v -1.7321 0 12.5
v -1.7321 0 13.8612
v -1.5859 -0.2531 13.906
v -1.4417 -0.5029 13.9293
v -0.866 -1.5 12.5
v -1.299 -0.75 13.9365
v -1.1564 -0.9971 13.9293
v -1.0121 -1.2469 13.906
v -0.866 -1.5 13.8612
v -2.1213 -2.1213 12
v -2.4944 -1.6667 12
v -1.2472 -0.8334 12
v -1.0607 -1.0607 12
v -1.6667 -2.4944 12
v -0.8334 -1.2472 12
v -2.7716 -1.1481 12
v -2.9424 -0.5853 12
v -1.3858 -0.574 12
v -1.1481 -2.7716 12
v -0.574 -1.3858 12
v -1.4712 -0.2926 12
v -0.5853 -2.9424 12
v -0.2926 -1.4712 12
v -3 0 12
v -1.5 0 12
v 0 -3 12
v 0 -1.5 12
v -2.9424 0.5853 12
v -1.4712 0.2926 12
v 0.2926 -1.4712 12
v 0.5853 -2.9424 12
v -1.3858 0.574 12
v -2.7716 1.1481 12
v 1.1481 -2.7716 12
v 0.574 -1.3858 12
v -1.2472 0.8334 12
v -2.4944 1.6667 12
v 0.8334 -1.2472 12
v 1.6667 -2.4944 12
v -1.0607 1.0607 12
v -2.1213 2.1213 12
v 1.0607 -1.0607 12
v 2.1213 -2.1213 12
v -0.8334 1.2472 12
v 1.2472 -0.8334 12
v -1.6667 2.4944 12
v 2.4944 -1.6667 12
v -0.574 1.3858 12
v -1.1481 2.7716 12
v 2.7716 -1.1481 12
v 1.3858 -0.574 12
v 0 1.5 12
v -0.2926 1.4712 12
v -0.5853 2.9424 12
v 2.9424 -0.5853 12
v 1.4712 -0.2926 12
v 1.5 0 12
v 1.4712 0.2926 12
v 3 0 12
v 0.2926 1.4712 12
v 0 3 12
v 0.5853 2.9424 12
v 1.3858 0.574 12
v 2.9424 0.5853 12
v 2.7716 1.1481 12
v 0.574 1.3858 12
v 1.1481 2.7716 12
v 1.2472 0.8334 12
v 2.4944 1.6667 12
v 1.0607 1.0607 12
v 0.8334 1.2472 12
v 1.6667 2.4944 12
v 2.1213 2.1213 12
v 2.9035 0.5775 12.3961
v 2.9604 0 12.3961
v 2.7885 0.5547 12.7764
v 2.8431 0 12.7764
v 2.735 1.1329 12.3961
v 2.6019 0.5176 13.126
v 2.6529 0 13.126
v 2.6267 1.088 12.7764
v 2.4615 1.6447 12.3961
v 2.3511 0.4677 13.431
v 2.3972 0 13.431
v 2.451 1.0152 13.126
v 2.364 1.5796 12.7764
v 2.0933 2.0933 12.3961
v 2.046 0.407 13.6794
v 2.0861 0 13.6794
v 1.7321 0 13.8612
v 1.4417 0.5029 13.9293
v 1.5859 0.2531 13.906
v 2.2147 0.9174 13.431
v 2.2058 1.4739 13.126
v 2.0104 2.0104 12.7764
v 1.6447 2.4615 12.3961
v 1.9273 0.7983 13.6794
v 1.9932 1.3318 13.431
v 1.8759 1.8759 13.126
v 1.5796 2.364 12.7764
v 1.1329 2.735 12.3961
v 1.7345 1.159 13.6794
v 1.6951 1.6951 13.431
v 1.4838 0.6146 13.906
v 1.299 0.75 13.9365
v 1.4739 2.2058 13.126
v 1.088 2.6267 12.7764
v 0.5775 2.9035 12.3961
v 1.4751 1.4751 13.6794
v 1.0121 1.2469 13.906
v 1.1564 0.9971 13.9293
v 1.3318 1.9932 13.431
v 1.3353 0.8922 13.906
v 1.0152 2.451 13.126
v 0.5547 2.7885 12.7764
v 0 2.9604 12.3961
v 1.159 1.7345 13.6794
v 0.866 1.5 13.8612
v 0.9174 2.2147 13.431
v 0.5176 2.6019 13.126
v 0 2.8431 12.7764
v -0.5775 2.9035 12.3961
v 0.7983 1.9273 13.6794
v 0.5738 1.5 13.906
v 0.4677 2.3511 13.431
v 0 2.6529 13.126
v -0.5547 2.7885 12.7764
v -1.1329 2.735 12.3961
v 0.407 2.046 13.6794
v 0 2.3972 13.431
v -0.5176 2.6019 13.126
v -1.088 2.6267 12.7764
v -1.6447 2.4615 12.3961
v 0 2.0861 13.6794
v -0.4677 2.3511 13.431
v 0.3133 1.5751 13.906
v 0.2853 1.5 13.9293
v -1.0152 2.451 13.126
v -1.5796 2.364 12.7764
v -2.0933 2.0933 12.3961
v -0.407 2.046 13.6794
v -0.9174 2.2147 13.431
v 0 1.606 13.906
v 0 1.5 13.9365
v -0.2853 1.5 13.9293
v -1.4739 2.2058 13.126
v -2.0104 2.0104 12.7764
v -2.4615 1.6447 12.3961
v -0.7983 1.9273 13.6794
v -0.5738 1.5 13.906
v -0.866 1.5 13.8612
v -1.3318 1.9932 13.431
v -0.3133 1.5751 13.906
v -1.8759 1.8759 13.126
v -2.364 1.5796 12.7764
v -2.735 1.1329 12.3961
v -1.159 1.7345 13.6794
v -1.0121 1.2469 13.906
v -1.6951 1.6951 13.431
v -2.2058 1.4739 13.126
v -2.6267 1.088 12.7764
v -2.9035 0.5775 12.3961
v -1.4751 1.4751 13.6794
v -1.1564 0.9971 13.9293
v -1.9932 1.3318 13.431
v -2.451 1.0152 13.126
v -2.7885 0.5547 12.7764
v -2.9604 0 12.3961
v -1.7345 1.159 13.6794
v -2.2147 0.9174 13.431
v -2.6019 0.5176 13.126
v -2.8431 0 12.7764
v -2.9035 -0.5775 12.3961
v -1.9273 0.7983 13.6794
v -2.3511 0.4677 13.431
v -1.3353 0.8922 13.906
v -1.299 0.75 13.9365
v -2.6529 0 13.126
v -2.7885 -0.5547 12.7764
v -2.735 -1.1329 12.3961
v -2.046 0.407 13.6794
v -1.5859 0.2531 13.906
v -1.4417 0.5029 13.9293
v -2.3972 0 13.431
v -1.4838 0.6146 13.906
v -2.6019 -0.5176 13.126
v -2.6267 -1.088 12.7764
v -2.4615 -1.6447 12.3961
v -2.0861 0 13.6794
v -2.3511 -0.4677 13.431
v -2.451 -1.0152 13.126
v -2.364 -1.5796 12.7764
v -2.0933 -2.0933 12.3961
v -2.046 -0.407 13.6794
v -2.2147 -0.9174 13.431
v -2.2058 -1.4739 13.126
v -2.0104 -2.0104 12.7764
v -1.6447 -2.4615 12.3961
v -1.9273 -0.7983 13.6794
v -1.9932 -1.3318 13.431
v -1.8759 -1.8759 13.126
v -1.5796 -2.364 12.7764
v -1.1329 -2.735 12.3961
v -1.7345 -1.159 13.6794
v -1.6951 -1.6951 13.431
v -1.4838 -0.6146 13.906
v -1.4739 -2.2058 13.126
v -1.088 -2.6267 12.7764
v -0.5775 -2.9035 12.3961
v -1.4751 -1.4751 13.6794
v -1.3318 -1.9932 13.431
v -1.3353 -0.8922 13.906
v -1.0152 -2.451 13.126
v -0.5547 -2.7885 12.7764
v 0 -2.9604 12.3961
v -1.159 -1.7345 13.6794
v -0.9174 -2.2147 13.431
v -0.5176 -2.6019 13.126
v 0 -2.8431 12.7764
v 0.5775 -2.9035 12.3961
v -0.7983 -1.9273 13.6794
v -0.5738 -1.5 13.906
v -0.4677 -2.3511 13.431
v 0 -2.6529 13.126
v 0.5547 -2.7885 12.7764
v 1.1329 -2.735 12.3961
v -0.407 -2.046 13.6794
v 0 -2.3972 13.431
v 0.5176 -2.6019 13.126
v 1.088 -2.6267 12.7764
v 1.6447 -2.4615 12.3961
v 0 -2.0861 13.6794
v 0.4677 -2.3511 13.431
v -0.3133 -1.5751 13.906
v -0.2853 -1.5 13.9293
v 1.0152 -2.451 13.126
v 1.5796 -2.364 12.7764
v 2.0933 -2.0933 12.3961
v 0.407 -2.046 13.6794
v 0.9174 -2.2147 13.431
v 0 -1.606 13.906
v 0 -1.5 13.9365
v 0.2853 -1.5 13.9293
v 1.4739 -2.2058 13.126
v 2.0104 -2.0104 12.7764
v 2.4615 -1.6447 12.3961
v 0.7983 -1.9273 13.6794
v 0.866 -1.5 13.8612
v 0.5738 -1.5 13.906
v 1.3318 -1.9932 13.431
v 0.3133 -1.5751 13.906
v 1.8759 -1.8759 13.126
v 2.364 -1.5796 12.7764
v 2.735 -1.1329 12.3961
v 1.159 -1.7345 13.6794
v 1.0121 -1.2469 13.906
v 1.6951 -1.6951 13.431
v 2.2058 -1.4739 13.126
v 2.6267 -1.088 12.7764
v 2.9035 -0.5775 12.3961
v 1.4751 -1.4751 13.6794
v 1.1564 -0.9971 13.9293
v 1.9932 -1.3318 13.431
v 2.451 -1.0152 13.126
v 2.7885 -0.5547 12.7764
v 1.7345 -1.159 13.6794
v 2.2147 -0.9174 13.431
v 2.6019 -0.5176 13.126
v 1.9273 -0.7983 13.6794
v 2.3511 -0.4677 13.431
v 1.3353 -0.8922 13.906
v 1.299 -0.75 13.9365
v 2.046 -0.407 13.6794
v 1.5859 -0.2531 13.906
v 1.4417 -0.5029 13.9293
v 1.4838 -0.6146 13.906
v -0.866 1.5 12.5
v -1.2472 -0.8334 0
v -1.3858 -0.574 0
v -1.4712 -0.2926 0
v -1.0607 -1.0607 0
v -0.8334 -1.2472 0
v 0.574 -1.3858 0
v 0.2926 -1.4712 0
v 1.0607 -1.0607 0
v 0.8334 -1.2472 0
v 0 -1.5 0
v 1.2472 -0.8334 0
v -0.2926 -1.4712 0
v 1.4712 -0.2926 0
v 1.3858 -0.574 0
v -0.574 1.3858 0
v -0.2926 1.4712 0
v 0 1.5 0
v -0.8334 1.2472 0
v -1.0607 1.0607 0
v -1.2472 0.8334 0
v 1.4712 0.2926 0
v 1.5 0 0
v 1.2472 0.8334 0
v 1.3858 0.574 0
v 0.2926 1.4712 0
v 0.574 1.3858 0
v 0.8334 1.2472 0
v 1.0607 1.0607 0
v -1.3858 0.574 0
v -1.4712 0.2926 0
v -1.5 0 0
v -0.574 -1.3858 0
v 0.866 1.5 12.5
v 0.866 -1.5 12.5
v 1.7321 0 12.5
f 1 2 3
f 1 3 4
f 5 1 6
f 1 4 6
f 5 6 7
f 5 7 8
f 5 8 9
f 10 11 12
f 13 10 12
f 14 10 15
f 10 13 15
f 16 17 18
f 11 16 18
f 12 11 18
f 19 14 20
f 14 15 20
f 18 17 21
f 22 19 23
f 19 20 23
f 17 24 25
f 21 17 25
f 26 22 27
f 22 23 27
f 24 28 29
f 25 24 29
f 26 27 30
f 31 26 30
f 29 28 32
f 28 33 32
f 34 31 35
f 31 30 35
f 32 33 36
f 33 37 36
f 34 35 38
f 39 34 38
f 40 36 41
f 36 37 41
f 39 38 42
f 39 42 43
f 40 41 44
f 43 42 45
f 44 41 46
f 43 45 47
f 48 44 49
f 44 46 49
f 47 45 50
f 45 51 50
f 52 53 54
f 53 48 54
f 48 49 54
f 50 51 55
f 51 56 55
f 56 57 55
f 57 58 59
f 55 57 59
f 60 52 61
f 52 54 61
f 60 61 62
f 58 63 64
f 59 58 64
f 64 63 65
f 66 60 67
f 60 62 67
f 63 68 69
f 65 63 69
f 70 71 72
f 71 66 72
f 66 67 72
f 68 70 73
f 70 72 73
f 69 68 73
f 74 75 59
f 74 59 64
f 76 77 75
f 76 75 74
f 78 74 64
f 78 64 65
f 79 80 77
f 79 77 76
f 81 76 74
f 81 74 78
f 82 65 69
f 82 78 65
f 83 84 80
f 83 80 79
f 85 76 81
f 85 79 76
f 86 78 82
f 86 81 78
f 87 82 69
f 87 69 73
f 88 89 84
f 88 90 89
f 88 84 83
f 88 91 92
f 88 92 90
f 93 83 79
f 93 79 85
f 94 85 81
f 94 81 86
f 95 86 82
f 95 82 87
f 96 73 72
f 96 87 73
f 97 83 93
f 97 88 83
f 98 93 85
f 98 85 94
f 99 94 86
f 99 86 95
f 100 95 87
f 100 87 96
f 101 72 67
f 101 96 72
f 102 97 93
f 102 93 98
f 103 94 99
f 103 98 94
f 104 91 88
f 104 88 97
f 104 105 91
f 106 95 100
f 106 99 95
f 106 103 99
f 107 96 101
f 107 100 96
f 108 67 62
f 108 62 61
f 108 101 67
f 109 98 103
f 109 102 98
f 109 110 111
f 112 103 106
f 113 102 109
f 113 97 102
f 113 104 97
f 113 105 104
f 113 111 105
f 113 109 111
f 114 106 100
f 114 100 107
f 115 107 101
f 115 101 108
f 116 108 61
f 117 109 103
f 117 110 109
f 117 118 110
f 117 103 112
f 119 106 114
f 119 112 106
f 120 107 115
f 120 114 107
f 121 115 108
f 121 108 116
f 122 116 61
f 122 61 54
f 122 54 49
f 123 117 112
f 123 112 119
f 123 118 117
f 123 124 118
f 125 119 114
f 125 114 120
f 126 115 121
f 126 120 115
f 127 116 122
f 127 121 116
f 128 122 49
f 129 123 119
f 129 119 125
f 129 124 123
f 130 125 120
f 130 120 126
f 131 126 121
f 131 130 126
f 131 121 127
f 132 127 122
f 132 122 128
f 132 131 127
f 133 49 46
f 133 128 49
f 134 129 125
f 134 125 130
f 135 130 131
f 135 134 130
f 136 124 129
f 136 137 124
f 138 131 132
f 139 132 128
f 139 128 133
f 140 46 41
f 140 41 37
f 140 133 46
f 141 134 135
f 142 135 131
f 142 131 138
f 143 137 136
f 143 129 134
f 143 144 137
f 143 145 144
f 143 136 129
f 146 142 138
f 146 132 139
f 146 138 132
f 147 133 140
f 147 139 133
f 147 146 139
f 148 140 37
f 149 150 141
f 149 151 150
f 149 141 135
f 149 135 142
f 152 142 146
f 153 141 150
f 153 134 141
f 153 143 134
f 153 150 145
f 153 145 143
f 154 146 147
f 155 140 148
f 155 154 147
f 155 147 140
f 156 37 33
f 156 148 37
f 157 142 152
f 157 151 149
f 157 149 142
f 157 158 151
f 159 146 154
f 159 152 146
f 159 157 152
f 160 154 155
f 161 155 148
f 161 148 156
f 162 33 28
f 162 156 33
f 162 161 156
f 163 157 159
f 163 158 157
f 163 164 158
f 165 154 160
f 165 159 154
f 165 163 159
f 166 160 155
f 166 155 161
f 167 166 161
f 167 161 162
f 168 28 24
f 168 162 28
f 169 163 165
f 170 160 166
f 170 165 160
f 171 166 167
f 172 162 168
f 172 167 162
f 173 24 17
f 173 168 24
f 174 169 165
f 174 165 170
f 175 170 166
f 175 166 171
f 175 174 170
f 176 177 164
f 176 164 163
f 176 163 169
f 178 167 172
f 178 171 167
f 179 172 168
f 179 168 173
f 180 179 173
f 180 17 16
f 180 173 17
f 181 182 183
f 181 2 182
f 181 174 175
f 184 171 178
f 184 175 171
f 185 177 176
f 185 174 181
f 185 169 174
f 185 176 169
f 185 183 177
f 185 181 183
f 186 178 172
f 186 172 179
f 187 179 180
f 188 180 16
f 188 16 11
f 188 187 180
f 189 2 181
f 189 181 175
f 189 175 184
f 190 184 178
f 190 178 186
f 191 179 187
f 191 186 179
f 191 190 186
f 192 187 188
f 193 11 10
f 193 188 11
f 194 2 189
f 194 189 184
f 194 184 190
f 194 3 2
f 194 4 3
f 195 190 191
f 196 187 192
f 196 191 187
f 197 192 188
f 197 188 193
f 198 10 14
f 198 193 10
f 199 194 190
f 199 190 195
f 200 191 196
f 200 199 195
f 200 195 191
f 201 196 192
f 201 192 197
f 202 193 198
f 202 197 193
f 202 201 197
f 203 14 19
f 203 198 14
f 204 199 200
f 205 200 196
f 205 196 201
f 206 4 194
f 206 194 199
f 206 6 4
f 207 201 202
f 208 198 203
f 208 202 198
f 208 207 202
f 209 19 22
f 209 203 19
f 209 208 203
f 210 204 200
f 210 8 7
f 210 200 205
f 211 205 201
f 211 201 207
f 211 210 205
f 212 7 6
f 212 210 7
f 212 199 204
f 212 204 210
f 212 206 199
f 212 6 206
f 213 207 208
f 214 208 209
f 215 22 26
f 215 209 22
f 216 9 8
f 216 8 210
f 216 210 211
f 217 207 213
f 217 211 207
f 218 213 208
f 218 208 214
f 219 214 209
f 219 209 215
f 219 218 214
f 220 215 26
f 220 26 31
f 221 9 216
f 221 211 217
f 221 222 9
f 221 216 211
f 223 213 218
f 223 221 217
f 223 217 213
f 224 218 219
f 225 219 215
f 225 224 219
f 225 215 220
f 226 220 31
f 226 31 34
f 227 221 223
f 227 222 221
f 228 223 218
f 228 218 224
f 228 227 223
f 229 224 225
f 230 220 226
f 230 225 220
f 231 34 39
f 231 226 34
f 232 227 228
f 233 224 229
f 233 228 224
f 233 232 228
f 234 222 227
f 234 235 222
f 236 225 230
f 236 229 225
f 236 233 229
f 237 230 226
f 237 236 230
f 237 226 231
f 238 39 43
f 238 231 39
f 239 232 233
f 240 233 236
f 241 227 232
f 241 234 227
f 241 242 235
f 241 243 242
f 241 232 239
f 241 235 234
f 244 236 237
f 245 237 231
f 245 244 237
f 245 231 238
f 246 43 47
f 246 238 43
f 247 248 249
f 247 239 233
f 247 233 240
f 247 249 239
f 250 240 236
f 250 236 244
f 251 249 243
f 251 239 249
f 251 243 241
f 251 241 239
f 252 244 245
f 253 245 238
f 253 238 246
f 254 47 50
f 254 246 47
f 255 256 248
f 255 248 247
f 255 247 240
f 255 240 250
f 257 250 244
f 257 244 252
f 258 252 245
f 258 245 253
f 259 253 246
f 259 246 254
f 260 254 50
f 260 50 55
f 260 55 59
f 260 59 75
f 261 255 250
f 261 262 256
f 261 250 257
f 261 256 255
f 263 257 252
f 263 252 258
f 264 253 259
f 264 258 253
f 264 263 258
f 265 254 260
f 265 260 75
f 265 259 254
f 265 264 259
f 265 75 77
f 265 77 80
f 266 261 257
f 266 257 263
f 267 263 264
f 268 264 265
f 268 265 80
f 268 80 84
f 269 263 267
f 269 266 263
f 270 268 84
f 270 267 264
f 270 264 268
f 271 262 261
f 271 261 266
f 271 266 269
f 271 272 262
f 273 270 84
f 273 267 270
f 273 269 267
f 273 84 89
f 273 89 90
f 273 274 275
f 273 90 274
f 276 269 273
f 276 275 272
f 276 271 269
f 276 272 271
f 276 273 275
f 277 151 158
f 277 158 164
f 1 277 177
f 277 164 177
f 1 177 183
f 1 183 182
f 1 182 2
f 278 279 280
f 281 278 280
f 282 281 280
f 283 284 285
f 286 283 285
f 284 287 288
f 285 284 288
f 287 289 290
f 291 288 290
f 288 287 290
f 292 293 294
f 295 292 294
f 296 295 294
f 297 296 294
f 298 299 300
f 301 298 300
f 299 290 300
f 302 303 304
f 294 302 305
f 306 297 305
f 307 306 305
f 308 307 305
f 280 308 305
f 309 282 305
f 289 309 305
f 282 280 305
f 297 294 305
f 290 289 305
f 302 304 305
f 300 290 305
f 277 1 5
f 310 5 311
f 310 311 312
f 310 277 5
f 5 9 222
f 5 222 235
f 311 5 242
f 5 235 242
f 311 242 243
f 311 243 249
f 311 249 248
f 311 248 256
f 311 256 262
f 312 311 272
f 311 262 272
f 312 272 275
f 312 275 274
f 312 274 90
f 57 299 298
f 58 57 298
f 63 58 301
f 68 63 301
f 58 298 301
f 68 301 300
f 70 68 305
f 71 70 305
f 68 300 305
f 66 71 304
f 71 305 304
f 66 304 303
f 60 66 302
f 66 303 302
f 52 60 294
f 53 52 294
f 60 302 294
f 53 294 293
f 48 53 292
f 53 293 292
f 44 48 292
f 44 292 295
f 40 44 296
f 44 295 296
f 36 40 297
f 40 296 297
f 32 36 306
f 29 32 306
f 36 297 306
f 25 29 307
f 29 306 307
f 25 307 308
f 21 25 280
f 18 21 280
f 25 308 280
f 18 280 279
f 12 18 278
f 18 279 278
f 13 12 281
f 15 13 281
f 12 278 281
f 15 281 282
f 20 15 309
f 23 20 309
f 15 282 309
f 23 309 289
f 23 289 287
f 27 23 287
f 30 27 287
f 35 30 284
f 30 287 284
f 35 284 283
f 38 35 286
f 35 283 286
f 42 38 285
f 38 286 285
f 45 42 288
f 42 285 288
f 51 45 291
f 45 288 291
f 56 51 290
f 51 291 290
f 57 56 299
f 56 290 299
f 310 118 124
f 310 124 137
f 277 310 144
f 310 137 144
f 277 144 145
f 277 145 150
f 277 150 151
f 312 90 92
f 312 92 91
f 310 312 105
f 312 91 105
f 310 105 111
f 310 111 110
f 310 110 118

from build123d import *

# Parameters (mm, degrees)
SKETCH1_R           = 1.5
BOSS_EXTRUDE1_DEPTH = 12
SKETCH2_R           = 3
BOSS_EXTRUDE2_DEPTH = 2
CUT_EXTRUDE1_DEPTH  = 1.5
FILLET1_R           = 2


with BuildPart() as part:
    # Sketch1 → Boss-Extrude1 (new body)
    with BuildSketch(Plane.XY):
        Circle(SKETCH1_R)
    extrude(amount=BOSS_EXTRUDE1_DEPTH)

    # Sketch2 → Boss-Extrude2 (add)
    with BuildSketch(Plane.XY.offset(12)):
        Circle(SKETCH2_R)
    extrude(amount=BOSS_EXTRUDE2_DEPTH)

    # Sketch3 → Cut-Extrude1 (cut)
    with BuildSketch(Plane.XY.offset(14)):
        Polygon((-1.732050808, 0), (-0.866025404, -1.5), (0.866025404, -1.5), (1.732050808, 0), (0.866025404, 1.5), (-0.866025404, 1.5), align=None)
    extrude(amount=-CUT_EXTRUDE1_DEPTH, mode=Mode.SUBTRACT)

    # Fillet1
    # the kernel refuses this fillet: 2 mm, written as the material it takes off along each edge
    with BuildSketch(Plane(origin=(0, 0, 14), x_dir=(1, 0, 0), z_dir=(0, -1, 0))) as fillet1_piece_1:
        with BuildLine():
            CenterArc((3 - FILLET1_R, -FILLET1_R), FILLET1_R, 0, 90)
            Line((3 - FILLET1_R, 0), (3, 0))
            Line((3, 0), (3, -FILLET1_R))
        make_face()
    revolve(axis=Axis((0, 0, 14), (0, 0, 1)), mode=Mode.SUBTRACT)


solid = part.part
